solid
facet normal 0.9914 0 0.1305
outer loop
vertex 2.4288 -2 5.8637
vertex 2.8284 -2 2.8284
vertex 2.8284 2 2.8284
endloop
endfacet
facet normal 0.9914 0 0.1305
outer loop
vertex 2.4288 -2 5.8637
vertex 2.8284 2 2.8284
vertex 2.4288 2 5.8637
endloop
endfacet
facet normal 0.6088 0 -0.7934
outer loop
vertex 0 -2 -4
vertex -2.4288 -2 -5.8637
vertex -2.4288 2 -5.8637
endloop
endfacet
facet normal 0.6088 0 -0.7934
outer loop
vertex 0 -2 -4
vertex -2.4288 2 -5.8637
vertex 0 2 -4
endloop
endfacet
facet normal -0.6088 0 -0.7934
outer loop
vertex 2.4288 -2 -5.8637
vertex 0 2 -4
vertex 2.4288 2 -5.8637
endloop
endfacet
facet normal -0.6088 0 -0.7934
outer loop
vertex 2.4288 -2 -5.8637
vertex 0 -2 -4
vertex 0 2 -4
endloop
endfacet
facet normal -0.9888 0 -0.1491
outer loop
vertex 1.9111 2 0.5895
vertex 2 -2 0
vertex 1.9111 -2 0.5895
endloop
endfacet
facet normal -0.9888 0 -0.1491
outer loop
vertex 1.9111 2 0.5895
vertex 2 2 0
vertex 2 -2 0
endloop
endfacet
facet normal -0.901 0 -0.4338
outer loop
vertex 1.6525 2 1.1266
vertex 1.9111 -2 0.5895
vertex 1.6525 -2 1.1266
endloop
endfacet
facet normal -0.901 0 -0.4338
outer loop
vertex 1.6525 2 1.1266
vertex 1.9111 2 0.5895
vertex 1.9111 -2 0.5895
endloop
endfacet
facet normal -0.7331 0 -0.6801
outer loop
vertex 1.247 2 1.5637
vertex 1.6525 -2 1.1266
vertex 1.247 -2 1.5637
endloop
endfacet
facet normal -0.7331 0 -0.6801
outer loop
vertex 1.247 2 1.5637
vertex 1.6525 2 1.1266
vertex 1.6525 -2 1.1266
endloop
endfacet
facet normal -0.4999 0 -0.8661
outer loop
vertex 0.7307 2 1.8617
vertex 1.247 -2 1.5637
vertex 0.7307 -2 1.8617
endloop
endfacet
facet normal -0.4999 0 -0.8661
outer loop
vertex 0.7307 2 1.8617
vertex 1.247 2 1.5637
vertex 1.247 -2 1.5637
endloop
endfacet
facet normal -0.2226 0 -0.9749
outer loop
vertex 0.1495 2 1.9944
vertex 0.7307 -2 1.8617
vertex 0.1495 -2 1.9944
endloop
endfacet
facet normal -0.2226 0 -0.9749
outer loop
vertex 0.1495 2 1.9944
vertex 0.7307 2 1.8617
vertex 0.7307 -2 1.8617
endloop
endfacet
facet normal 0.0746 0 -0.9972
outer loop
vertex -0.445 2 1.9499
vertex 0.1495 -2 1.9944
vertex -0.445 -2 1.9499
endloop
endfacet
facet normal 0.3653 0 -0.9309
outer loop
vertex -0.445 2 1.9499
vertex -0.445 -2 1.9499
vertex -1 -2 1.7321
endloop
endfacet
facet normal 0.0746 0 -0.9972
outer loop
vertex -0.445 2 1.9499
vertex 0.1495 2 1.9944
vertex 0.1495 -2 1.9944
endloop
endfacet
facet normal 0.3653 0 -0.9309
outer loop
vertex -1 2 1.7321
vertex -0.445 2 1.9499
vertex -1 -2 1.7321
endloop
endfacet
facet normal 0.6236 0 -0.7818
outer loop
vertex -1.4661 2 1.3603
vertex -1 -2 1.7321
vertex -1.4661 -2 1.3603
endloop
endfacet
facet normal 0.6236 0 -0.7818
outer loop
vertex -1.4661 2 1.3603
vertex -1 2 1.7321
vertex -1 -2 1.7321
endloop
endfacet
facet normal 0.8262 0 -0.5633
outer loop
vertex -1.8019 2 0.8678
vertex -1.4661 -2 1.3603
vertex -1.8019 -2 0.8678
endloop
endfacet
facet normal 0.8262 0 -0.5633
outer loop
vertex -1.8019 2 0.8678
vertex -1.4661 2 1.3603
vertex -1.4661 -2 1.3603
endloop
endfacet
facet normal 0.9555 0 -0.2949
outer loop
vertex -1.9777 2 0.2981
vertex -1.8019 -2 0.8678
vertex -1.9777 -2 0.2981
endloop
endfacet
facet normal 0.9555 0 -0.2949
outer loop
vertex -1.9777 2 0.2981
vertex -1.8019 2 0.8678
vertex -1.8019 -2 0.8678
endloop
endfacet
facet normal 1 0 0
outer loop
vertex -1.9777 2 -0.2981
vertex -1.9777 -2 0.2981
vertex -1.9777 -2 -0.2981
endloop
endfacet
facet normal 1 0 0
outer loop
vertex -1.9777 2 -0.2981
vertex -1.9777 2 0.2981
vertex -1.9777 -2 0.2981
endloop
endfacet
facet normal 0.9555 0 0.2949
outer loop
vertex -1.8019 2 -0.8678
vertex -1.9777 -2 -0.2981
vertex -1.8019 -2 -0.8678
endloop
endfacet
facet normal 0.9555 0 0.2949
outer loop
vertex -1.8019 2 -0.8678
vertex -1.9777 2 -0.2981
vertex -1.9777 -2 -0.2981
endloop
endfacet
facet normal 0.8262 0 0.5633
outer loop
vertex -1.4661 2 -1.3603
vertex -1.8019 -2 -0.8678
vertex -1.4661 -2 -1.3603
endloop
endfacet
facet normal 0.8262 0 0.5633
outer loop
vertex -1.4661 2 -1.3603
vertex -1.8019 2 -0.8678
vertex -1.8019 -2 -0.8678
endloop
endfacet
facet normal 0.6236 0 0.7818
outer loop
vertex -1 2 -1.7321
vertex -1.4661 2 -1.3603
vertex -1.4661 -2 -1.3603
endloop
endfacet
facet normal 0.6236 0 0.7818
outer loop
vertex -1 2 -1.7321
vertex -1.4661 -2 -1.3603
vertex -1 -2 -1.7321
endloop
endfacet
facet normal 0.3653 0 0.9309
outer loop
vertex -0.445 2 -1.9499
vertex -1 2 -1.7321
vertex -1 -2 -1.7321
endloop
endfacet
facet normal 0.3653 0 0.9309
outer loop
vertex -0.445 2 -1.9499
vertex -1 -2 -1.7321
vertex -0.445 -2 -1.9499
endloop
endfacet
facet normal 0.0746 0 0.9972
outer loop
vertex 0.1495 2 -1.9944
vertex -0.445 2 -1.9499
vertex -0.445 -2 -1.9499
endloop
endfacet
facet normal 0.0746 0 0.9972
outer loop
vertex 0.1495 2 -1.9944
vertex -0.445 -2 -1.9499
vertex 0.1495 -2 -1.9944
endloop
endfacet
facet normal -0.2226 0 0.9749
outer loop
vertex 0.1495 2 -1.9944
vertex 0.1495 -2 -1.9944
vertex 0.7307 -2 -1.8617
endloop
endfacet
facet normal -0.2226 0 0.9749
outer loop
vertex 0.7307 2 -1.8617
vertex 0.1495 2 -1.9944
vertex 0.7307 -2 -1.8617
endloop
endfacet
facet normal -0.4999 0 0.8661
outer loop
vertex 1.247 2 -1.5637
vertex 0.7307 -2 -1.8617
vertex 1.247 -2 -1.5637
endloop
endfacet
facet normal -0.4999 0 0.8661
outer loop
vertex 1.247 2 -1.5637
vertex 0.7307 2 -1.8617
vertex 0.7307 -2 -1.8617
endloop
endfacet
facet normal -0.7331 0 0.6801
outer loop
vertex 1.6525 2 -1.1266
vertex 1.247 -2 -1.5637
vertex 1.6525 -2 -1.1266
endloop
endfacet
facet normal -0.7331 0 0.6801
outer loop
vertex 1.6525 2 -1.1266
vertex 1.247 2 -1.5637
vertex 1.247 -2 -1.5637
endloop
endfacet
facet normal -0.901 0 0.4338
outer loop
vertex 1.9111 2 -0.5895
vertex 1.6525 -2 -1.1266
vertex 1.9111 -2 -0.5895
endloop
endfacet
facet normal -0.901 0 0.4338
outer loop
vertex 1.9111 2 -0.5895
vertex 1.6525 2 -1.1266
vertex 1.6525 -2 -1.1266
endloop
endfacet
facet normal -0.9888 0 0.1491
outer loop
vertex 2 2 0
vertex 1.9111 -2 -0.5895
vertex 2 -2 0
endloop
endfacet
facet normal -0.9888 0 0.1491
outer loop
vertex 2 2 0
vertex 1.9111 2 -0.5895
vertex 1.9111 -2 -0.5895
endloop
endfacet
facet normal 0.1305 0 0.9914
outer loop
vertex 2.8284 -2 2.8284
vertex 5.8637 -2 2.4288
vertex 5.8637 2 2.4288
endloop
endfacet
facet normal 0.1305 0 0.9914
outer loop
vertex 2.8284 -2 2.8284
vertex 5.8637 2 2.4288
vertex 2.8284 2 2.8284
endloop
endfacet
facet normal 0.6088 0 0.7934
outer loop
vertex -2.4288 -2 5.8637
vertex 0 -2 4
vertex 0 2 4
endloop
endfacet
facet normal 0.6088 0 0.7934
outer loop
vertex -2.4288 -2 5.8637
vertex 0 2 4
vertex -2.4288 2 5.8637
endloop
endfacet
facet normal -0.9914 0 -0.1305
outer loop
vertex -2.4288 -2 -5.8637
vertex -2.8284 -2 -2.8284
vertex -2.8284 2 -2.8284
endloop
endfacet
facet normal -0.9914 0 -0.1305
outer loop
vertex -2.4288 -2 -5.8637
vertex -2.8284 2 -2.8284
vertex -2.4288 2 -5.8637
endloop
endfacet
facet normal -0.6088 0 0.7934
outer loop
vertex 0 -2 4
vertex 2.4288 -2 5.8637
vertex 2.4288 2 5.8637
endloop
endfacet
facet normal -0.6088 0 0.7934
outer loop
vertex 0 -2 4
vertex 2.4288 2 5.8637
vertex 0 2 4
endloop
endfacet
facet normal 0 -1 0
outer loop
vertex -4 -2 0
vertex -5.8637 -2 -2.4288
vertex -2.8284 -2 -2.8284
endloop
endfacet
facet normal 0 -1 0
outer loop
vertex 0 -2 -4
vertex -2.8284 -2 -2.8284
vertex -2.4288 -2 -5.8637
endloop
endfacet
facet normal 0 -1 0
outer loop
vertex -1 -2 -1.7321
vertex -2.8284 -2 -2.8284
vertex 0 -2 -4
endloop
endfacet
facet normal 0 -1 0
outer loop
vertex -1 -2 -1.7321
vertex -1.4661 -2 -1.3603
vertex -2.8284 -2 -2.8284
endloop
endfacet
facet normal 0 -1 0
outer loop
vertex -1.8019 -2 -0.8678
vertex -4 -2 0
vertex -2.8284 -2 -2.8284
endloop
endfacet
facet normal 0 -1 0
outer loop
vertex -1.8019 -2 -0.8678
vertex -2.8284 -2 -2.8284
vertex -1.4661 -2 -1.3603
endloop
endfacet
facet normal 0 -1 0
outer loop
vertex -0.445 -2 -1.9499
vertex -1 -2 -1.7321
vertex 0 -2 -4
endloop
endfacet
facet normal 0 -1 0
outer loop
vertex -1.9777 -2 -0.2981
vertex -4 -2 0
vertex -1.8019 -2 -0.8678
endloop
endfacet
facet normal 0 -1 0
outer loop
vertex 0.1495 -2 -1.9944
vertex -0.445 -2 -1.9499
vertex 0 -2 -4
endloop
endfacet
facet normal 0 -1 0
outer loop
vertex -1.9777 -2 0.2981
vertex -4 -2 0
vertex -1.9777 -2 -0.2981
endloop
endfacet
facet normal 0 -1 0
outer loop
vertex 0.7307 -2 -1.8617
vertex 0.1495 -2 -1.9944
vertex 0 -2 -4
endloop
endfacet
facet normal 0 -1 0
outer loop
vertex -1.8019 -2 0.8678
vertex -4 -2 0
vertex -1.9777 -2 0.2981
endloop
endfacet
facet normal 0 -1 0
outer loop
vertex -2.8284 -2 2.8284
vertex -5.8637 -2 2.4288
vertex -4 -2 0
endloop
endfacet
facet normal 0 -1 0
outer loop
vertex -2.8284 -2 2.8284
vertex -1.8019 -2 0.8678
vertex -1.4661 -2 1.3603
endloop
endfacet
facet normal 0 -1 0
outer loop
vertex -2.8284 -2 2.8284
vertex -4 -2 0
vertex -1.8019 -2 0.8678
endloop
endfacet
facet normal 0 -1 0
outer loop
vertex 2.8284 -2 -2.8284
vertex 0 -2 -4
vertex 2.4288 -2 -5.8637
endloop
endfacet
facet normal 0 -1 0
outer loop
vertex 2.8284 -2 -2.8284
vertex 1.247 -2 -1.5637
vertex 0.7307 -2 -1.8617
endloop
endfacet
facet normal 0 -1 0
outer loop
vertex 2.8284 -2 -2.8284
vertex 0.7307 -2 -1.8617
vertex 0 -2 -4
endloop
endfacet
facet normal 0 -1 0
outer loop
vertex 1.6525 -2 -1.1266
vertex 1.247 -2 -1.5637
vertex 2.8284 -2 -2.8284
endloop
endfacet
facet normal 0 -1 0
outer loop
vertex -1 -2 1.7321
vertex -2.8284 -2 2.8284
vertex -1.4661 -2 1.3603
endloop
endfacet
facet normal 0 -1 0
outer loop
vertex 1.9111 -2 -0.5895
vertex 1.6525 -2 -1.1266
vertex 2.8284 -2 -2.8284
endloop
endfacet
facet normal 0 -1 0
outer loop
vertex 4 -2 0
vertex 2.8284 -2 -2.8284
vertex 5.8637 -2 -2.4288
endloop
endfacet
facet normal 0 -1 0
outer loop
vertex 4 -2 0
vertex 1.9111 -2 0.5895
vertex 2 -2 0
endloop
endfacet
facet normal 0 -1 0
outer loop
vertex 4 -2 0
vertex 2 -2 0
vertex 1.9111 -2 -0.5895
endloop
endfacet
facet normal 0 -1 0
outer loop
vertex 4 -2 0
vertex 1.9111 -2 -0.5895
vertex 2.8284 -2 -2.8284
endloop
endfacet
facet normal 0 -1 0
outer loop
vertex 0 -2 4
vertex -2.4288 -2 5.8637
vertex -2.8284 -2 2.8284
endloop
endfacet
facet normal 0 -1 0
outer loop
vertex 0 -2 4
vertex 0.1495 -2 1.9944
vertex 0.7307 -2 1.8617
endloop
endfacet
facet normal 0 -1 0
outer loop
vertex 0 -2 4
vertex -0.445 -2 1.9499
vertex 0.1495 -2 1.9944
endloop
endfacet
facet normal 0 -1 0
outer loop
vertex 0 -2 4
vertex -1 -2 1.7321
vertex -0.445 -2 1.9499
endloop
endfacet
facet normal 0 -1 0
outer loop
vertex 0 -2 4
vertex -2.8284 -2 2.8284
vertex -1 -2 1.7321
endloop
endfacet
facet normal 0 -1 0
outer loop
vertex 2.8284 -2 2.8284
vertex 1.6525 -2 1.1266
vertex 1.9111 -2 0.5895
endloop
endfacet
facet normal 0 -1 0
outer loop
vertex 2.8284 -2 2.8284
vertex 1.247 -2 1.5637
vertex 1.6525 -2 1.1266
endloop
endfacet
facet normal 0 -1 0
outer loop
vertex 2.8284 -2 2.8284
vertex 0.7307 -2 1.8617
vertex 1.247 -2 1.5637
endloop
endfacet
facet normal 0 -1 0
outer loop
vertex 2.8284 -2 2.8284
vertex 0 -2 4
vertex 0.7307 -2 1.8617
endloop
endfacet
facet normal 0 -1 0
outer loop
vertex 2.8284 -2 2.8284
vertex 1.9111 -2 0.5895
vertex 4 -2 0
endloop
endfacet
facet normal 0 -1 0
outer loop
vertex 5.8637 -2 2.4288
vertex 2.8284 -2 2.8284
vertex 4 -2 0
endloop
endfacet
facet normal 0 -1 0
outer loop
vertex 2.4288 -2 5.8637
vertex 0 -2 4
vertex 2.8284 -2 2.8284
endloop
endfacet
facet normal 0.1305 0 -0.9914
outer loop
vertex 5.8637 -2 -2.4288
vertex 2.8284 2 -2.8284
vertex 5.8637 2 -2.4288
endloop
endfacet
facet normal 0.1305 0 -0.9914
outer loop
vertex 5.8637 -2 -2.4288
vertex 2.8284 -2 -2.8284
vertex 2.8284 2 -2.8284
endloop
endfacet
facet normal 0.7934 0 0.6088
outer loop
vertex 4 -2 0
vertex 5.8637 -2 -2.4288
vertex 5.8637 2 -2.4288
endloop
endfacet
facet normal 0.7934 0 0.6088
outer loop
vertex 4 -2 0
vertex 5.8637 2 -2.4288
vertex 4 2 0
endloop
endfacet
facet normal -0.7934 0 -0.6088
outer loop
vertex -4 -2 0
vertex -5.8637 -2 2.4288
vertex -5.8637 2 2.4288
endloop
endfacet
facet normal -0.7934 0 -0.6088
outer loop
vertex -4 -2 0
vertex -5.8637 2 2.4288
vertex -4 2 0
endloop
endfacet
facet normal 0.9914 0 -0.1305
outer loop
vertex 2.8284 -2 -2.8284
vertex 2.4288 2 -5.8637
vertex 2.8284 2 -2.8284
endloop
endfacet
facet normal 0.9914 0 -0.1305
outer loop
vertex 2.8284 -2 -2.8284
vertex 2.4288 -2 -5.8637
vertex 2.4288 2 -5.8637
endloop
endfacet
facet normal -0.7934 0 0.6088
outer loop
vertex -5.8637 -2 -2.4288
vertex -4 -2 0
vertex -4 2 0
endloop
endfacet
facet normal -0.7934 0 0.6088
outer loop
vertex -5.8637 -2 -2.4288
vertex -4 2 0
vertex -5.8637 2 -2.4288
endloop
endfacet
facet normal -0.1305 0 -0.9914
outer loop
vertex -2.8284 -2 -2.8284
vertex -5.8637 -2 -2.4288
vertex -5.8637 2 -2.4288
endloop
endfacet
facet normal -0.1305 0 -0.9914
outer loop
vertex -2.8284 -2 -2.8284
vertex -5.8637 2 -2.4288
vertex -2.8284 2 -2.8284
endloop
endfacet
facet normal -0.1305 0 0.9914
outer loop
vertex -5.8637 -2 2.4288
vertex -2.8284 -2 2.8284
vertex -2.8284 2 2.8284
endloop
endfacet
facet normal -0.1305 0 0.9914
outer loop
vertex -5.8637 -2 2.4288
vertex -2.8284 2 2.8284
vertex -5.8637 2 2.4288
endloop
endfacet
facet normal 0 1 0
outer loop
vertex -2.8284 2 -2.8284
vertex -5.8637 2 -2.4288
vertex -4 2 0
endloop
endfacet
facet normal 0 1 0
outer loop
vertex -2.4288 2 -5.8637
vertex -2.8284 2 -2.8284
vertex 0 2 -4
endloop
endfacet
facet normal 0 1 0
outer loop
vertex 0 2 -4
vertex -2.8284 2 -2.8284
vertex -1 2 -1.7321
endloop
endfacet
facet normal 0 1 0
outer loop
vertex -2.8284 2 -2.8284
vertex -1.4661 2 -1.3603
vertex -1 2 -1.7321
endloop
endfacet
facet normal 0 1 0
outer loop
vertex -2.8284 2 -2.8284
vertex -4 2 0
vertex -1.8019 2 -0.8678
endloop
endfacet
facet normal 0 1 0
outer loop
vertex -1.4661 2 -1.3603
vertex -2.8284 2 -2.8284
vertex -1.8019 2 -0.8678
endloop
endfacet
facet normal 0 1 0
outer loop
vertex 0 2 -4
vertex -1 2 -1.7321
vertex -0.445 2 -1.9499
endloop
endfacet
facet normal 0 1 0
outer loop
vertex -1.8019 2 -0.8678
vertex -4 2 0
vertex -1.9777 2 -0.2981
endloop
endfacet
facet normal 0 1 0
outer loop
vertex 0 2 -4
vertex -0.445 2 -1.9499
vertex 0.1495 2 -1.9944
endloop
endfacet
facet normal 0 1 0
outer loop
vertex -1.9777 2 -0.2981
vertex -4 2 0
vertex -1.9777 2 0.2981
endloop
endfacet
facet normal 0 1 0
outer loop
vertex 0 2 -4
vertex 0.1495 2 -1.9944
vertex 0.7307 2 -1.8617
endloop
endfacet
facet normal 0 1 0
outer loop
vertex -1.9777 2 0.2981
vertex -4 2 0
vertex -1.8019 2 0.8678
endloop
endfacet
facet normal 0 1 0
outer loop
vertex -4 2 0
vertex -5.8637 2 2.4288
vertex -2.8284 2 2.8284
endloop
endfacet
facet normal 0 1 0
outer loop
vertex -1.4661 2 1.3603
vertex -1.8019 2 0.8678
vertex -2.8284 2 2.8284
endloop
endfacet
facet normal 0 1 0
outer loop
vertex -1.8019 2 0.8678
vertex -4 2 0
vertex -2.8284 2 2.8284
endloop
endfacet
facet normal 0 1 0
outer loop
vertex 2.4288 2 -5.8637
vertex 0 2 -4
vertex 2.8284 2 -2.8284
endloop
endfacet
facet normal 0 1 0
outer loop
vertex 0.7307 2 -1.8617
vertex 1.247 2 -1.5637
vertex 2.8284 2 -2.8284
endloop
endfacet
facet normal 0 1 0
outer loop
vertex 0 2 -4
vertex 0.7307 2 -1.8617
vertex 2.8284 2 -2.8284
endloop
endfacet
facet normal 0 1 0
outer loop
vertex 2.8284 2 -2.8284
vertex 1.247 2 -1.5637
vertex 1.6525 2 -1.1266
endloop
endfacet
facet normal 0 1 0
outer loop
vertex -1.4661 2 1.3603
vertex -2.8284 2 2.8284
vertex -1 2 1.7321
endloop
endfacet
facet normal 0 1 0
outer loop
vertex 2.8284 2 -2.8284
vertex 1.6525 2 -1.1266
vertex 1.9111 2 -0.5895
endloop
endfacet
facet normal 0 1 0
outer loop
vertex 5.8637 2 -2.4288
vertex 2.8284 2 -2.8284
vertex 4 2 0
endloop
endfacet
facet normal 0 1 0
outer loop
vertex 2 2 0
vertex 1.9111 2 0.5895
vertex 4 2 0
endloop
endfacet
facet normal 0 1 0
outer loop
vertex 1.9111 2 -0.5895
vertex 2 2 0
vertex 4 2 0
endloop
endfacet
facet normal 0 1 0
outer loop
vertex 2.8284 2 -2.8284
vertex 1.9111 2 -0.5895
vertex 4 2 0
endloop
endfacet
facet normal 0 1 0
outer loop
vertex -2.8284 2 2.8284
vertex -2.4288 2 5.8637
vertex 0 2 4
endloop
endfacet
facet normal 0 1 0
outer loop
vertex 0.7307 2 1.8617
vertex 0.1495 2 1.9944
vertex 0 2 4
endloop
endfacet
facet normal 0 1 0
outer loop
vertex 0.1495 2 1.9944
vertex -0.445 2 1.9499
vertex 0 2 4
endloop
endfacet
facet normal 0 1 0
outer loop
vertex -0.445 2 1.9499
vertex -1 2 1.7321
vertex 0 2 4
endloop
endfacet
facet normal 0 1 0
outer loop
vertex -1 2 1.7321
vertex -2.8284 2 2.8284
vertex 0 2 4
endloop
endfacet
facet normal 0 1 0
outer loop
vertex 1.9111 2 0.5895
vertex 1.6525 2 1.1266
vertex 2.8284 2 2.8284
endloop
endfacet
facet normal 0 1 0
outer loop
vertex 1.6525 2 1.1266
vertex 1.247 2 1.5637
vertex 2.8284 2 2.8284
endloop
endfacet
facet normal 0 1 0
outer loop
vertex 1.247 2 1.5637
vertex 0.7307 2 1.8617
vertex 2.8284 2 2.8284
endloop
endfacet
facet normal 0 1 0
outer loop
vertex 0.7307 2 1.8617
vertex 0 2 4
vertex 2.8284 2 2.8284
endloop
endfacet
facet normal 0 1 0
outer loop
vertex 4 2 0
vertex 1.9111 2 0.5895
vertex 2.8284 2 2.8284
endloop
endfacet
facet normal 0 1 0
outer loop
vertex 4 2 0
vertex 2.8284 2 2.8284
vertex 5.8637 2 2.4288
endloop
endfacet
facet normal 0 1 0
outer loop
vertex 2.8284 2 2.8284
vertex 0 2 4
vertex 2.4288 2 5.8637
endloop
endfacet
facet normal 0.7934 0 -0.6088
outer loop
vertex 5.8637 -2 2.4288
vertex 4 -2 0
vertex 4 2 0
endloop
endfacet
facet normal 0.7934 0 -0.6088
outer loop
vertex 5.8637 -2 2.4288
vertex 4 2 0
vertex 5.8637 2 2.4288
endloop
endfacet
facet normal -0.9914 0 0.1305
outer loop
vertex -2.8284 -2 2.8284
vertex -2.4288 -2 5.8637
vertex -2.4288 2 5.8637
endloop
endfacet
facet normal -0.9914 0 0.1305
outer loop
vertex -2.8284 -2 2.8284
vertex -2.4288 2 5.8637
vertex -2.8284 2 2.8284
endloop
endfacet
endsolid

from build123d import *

# Parameters (mm, degrees)
F0_R     = 2
F1_DEPTH = 2


with BuildPart() as f1:
    # F0 (on Front) → F1 (new body, symmetric)
    with BuildSketch(Plane.XZ):
        with BuildLine():
            ThreePointArc((2.8284271247, -2.8284271247), (3.69551813, -1.5307337295), (4, 0))
            ThreePointArc((4, 0), (3.69551813, 1.5307337295), (2.8284271247, 2.8284271247))
            ThreePointArc((2.8284271247, 2.8284271247), (1.5307337295, 3.69551813), (0, 4))
            ThreePointArc((0, 4), (-1.5307337295, 3.69551813), (-2.8284271247, 2.8284271247))
            ThreePointArc((-2.8284271247, 2.8284271247), (-3.69551813, 1.5307337295), (-4, 0))
            ThreePointArc((-4, 0), (-3.69551813, -1.5307337295), (-2.8284271247, -2.8284271247))
            ThreePointArc((-2.8284271247, -2.8284271247), (-1.5307337295, -3.69551813), (0, -4))
            ThreePointArc((0, -4), (1.5307337295, -3.69551813), (2.8284271247, -2.8284271247))
        make_face()
        Circle(F0_R, mode=Mode.SUBTRACT)
        with BuildLine():
            Line((5.8637033052, -2.4288254347), (4, 0))
            ThreePointArc((4, 0), (3.69551813, -1.5307337295), (2.8284271247, -2.8284271247))
            Line((2.8284271247, -2.8284271247), (5.8637033052, -2.4288254347))
        make_face()
        with BuildLine():
            ThreePointArc((2.8284271247, 2.8284271247), (3.69551813, 1.5307337295), (4, 0))
            Line((4, 0), (5.8637033052, 2.4288254347))
            Line((5.8637033052, 2.4288254347), (2.8284271247, 2.8284271247))
        make_face()
        with BuildLine():
            ThreePointArc((0, 4), (1.5307337295, 3.69551813), (2.8284271247, 2.8284271247))
            Line((2.8284271247, 2.8284271247), (2.4288254347, 5.8637033052))
            Line((2.4288254347, 5.8637033052), (0, 4))
        make_face()
        with BuildLine():
            Line((2.4288254347, -5.8637033052), (2.8284271247, -2.8284271247))
            ThreePointArc((2.8284271247, -2.8284271247), (1.5307337295, -3.69551813), (0, -4))
            Line((0, -4), (2.4288254347, -5.8637033052))
        make_face()
        with BuildLine():
            ThreePointArc((-2.8284271247, 2.8284271247), (-1.5307337295, 3.69551813), (0, 4))
            Line((0, 4), (-2.4288254347, 5.8637033052))
            Line((-2.4288254347, 5.8637033052), (-2.8284271247, 2.8284271247))
        make_face()
        with BuildLine():
            Line((-2.4288254347, -5.8637033052), (0, -4))
            ThreePointArc((0, -4), (-1.5307337295, -3.69551813), (-2.8284271247, -2.8284271247))
            Line((-2.8284271247, -2.8284271247), (-2.4288254347, -5.8637033052))
        make_face()
        with BuildLine():
            ThreePointArc((-4, 0), (-3.69551813, 1.5307337295), (-2.8284271247, 2.8284271247))
            Line((-2.8284271247, 2.8284271247), (-5.8637033052, 2.4288254347))
            Line((-5.8637033052, 2.4288254347), (-4, 0))
        make_face()
        with BuildLine():
            Line((-5.8637033052, -2.4288254347), (-2.8284271247, -2.8284271247))
            ThreePointArc((-2.8284271247, -2.8284271247), (-3.69551813, -1.5307337295), (-4, 0))
            Line((-4, 0), (-5.8637033052, -2.4288254347))
        make_face()
    extrude(amount=F1_DEPTH, both=True)


solid = f1.part
